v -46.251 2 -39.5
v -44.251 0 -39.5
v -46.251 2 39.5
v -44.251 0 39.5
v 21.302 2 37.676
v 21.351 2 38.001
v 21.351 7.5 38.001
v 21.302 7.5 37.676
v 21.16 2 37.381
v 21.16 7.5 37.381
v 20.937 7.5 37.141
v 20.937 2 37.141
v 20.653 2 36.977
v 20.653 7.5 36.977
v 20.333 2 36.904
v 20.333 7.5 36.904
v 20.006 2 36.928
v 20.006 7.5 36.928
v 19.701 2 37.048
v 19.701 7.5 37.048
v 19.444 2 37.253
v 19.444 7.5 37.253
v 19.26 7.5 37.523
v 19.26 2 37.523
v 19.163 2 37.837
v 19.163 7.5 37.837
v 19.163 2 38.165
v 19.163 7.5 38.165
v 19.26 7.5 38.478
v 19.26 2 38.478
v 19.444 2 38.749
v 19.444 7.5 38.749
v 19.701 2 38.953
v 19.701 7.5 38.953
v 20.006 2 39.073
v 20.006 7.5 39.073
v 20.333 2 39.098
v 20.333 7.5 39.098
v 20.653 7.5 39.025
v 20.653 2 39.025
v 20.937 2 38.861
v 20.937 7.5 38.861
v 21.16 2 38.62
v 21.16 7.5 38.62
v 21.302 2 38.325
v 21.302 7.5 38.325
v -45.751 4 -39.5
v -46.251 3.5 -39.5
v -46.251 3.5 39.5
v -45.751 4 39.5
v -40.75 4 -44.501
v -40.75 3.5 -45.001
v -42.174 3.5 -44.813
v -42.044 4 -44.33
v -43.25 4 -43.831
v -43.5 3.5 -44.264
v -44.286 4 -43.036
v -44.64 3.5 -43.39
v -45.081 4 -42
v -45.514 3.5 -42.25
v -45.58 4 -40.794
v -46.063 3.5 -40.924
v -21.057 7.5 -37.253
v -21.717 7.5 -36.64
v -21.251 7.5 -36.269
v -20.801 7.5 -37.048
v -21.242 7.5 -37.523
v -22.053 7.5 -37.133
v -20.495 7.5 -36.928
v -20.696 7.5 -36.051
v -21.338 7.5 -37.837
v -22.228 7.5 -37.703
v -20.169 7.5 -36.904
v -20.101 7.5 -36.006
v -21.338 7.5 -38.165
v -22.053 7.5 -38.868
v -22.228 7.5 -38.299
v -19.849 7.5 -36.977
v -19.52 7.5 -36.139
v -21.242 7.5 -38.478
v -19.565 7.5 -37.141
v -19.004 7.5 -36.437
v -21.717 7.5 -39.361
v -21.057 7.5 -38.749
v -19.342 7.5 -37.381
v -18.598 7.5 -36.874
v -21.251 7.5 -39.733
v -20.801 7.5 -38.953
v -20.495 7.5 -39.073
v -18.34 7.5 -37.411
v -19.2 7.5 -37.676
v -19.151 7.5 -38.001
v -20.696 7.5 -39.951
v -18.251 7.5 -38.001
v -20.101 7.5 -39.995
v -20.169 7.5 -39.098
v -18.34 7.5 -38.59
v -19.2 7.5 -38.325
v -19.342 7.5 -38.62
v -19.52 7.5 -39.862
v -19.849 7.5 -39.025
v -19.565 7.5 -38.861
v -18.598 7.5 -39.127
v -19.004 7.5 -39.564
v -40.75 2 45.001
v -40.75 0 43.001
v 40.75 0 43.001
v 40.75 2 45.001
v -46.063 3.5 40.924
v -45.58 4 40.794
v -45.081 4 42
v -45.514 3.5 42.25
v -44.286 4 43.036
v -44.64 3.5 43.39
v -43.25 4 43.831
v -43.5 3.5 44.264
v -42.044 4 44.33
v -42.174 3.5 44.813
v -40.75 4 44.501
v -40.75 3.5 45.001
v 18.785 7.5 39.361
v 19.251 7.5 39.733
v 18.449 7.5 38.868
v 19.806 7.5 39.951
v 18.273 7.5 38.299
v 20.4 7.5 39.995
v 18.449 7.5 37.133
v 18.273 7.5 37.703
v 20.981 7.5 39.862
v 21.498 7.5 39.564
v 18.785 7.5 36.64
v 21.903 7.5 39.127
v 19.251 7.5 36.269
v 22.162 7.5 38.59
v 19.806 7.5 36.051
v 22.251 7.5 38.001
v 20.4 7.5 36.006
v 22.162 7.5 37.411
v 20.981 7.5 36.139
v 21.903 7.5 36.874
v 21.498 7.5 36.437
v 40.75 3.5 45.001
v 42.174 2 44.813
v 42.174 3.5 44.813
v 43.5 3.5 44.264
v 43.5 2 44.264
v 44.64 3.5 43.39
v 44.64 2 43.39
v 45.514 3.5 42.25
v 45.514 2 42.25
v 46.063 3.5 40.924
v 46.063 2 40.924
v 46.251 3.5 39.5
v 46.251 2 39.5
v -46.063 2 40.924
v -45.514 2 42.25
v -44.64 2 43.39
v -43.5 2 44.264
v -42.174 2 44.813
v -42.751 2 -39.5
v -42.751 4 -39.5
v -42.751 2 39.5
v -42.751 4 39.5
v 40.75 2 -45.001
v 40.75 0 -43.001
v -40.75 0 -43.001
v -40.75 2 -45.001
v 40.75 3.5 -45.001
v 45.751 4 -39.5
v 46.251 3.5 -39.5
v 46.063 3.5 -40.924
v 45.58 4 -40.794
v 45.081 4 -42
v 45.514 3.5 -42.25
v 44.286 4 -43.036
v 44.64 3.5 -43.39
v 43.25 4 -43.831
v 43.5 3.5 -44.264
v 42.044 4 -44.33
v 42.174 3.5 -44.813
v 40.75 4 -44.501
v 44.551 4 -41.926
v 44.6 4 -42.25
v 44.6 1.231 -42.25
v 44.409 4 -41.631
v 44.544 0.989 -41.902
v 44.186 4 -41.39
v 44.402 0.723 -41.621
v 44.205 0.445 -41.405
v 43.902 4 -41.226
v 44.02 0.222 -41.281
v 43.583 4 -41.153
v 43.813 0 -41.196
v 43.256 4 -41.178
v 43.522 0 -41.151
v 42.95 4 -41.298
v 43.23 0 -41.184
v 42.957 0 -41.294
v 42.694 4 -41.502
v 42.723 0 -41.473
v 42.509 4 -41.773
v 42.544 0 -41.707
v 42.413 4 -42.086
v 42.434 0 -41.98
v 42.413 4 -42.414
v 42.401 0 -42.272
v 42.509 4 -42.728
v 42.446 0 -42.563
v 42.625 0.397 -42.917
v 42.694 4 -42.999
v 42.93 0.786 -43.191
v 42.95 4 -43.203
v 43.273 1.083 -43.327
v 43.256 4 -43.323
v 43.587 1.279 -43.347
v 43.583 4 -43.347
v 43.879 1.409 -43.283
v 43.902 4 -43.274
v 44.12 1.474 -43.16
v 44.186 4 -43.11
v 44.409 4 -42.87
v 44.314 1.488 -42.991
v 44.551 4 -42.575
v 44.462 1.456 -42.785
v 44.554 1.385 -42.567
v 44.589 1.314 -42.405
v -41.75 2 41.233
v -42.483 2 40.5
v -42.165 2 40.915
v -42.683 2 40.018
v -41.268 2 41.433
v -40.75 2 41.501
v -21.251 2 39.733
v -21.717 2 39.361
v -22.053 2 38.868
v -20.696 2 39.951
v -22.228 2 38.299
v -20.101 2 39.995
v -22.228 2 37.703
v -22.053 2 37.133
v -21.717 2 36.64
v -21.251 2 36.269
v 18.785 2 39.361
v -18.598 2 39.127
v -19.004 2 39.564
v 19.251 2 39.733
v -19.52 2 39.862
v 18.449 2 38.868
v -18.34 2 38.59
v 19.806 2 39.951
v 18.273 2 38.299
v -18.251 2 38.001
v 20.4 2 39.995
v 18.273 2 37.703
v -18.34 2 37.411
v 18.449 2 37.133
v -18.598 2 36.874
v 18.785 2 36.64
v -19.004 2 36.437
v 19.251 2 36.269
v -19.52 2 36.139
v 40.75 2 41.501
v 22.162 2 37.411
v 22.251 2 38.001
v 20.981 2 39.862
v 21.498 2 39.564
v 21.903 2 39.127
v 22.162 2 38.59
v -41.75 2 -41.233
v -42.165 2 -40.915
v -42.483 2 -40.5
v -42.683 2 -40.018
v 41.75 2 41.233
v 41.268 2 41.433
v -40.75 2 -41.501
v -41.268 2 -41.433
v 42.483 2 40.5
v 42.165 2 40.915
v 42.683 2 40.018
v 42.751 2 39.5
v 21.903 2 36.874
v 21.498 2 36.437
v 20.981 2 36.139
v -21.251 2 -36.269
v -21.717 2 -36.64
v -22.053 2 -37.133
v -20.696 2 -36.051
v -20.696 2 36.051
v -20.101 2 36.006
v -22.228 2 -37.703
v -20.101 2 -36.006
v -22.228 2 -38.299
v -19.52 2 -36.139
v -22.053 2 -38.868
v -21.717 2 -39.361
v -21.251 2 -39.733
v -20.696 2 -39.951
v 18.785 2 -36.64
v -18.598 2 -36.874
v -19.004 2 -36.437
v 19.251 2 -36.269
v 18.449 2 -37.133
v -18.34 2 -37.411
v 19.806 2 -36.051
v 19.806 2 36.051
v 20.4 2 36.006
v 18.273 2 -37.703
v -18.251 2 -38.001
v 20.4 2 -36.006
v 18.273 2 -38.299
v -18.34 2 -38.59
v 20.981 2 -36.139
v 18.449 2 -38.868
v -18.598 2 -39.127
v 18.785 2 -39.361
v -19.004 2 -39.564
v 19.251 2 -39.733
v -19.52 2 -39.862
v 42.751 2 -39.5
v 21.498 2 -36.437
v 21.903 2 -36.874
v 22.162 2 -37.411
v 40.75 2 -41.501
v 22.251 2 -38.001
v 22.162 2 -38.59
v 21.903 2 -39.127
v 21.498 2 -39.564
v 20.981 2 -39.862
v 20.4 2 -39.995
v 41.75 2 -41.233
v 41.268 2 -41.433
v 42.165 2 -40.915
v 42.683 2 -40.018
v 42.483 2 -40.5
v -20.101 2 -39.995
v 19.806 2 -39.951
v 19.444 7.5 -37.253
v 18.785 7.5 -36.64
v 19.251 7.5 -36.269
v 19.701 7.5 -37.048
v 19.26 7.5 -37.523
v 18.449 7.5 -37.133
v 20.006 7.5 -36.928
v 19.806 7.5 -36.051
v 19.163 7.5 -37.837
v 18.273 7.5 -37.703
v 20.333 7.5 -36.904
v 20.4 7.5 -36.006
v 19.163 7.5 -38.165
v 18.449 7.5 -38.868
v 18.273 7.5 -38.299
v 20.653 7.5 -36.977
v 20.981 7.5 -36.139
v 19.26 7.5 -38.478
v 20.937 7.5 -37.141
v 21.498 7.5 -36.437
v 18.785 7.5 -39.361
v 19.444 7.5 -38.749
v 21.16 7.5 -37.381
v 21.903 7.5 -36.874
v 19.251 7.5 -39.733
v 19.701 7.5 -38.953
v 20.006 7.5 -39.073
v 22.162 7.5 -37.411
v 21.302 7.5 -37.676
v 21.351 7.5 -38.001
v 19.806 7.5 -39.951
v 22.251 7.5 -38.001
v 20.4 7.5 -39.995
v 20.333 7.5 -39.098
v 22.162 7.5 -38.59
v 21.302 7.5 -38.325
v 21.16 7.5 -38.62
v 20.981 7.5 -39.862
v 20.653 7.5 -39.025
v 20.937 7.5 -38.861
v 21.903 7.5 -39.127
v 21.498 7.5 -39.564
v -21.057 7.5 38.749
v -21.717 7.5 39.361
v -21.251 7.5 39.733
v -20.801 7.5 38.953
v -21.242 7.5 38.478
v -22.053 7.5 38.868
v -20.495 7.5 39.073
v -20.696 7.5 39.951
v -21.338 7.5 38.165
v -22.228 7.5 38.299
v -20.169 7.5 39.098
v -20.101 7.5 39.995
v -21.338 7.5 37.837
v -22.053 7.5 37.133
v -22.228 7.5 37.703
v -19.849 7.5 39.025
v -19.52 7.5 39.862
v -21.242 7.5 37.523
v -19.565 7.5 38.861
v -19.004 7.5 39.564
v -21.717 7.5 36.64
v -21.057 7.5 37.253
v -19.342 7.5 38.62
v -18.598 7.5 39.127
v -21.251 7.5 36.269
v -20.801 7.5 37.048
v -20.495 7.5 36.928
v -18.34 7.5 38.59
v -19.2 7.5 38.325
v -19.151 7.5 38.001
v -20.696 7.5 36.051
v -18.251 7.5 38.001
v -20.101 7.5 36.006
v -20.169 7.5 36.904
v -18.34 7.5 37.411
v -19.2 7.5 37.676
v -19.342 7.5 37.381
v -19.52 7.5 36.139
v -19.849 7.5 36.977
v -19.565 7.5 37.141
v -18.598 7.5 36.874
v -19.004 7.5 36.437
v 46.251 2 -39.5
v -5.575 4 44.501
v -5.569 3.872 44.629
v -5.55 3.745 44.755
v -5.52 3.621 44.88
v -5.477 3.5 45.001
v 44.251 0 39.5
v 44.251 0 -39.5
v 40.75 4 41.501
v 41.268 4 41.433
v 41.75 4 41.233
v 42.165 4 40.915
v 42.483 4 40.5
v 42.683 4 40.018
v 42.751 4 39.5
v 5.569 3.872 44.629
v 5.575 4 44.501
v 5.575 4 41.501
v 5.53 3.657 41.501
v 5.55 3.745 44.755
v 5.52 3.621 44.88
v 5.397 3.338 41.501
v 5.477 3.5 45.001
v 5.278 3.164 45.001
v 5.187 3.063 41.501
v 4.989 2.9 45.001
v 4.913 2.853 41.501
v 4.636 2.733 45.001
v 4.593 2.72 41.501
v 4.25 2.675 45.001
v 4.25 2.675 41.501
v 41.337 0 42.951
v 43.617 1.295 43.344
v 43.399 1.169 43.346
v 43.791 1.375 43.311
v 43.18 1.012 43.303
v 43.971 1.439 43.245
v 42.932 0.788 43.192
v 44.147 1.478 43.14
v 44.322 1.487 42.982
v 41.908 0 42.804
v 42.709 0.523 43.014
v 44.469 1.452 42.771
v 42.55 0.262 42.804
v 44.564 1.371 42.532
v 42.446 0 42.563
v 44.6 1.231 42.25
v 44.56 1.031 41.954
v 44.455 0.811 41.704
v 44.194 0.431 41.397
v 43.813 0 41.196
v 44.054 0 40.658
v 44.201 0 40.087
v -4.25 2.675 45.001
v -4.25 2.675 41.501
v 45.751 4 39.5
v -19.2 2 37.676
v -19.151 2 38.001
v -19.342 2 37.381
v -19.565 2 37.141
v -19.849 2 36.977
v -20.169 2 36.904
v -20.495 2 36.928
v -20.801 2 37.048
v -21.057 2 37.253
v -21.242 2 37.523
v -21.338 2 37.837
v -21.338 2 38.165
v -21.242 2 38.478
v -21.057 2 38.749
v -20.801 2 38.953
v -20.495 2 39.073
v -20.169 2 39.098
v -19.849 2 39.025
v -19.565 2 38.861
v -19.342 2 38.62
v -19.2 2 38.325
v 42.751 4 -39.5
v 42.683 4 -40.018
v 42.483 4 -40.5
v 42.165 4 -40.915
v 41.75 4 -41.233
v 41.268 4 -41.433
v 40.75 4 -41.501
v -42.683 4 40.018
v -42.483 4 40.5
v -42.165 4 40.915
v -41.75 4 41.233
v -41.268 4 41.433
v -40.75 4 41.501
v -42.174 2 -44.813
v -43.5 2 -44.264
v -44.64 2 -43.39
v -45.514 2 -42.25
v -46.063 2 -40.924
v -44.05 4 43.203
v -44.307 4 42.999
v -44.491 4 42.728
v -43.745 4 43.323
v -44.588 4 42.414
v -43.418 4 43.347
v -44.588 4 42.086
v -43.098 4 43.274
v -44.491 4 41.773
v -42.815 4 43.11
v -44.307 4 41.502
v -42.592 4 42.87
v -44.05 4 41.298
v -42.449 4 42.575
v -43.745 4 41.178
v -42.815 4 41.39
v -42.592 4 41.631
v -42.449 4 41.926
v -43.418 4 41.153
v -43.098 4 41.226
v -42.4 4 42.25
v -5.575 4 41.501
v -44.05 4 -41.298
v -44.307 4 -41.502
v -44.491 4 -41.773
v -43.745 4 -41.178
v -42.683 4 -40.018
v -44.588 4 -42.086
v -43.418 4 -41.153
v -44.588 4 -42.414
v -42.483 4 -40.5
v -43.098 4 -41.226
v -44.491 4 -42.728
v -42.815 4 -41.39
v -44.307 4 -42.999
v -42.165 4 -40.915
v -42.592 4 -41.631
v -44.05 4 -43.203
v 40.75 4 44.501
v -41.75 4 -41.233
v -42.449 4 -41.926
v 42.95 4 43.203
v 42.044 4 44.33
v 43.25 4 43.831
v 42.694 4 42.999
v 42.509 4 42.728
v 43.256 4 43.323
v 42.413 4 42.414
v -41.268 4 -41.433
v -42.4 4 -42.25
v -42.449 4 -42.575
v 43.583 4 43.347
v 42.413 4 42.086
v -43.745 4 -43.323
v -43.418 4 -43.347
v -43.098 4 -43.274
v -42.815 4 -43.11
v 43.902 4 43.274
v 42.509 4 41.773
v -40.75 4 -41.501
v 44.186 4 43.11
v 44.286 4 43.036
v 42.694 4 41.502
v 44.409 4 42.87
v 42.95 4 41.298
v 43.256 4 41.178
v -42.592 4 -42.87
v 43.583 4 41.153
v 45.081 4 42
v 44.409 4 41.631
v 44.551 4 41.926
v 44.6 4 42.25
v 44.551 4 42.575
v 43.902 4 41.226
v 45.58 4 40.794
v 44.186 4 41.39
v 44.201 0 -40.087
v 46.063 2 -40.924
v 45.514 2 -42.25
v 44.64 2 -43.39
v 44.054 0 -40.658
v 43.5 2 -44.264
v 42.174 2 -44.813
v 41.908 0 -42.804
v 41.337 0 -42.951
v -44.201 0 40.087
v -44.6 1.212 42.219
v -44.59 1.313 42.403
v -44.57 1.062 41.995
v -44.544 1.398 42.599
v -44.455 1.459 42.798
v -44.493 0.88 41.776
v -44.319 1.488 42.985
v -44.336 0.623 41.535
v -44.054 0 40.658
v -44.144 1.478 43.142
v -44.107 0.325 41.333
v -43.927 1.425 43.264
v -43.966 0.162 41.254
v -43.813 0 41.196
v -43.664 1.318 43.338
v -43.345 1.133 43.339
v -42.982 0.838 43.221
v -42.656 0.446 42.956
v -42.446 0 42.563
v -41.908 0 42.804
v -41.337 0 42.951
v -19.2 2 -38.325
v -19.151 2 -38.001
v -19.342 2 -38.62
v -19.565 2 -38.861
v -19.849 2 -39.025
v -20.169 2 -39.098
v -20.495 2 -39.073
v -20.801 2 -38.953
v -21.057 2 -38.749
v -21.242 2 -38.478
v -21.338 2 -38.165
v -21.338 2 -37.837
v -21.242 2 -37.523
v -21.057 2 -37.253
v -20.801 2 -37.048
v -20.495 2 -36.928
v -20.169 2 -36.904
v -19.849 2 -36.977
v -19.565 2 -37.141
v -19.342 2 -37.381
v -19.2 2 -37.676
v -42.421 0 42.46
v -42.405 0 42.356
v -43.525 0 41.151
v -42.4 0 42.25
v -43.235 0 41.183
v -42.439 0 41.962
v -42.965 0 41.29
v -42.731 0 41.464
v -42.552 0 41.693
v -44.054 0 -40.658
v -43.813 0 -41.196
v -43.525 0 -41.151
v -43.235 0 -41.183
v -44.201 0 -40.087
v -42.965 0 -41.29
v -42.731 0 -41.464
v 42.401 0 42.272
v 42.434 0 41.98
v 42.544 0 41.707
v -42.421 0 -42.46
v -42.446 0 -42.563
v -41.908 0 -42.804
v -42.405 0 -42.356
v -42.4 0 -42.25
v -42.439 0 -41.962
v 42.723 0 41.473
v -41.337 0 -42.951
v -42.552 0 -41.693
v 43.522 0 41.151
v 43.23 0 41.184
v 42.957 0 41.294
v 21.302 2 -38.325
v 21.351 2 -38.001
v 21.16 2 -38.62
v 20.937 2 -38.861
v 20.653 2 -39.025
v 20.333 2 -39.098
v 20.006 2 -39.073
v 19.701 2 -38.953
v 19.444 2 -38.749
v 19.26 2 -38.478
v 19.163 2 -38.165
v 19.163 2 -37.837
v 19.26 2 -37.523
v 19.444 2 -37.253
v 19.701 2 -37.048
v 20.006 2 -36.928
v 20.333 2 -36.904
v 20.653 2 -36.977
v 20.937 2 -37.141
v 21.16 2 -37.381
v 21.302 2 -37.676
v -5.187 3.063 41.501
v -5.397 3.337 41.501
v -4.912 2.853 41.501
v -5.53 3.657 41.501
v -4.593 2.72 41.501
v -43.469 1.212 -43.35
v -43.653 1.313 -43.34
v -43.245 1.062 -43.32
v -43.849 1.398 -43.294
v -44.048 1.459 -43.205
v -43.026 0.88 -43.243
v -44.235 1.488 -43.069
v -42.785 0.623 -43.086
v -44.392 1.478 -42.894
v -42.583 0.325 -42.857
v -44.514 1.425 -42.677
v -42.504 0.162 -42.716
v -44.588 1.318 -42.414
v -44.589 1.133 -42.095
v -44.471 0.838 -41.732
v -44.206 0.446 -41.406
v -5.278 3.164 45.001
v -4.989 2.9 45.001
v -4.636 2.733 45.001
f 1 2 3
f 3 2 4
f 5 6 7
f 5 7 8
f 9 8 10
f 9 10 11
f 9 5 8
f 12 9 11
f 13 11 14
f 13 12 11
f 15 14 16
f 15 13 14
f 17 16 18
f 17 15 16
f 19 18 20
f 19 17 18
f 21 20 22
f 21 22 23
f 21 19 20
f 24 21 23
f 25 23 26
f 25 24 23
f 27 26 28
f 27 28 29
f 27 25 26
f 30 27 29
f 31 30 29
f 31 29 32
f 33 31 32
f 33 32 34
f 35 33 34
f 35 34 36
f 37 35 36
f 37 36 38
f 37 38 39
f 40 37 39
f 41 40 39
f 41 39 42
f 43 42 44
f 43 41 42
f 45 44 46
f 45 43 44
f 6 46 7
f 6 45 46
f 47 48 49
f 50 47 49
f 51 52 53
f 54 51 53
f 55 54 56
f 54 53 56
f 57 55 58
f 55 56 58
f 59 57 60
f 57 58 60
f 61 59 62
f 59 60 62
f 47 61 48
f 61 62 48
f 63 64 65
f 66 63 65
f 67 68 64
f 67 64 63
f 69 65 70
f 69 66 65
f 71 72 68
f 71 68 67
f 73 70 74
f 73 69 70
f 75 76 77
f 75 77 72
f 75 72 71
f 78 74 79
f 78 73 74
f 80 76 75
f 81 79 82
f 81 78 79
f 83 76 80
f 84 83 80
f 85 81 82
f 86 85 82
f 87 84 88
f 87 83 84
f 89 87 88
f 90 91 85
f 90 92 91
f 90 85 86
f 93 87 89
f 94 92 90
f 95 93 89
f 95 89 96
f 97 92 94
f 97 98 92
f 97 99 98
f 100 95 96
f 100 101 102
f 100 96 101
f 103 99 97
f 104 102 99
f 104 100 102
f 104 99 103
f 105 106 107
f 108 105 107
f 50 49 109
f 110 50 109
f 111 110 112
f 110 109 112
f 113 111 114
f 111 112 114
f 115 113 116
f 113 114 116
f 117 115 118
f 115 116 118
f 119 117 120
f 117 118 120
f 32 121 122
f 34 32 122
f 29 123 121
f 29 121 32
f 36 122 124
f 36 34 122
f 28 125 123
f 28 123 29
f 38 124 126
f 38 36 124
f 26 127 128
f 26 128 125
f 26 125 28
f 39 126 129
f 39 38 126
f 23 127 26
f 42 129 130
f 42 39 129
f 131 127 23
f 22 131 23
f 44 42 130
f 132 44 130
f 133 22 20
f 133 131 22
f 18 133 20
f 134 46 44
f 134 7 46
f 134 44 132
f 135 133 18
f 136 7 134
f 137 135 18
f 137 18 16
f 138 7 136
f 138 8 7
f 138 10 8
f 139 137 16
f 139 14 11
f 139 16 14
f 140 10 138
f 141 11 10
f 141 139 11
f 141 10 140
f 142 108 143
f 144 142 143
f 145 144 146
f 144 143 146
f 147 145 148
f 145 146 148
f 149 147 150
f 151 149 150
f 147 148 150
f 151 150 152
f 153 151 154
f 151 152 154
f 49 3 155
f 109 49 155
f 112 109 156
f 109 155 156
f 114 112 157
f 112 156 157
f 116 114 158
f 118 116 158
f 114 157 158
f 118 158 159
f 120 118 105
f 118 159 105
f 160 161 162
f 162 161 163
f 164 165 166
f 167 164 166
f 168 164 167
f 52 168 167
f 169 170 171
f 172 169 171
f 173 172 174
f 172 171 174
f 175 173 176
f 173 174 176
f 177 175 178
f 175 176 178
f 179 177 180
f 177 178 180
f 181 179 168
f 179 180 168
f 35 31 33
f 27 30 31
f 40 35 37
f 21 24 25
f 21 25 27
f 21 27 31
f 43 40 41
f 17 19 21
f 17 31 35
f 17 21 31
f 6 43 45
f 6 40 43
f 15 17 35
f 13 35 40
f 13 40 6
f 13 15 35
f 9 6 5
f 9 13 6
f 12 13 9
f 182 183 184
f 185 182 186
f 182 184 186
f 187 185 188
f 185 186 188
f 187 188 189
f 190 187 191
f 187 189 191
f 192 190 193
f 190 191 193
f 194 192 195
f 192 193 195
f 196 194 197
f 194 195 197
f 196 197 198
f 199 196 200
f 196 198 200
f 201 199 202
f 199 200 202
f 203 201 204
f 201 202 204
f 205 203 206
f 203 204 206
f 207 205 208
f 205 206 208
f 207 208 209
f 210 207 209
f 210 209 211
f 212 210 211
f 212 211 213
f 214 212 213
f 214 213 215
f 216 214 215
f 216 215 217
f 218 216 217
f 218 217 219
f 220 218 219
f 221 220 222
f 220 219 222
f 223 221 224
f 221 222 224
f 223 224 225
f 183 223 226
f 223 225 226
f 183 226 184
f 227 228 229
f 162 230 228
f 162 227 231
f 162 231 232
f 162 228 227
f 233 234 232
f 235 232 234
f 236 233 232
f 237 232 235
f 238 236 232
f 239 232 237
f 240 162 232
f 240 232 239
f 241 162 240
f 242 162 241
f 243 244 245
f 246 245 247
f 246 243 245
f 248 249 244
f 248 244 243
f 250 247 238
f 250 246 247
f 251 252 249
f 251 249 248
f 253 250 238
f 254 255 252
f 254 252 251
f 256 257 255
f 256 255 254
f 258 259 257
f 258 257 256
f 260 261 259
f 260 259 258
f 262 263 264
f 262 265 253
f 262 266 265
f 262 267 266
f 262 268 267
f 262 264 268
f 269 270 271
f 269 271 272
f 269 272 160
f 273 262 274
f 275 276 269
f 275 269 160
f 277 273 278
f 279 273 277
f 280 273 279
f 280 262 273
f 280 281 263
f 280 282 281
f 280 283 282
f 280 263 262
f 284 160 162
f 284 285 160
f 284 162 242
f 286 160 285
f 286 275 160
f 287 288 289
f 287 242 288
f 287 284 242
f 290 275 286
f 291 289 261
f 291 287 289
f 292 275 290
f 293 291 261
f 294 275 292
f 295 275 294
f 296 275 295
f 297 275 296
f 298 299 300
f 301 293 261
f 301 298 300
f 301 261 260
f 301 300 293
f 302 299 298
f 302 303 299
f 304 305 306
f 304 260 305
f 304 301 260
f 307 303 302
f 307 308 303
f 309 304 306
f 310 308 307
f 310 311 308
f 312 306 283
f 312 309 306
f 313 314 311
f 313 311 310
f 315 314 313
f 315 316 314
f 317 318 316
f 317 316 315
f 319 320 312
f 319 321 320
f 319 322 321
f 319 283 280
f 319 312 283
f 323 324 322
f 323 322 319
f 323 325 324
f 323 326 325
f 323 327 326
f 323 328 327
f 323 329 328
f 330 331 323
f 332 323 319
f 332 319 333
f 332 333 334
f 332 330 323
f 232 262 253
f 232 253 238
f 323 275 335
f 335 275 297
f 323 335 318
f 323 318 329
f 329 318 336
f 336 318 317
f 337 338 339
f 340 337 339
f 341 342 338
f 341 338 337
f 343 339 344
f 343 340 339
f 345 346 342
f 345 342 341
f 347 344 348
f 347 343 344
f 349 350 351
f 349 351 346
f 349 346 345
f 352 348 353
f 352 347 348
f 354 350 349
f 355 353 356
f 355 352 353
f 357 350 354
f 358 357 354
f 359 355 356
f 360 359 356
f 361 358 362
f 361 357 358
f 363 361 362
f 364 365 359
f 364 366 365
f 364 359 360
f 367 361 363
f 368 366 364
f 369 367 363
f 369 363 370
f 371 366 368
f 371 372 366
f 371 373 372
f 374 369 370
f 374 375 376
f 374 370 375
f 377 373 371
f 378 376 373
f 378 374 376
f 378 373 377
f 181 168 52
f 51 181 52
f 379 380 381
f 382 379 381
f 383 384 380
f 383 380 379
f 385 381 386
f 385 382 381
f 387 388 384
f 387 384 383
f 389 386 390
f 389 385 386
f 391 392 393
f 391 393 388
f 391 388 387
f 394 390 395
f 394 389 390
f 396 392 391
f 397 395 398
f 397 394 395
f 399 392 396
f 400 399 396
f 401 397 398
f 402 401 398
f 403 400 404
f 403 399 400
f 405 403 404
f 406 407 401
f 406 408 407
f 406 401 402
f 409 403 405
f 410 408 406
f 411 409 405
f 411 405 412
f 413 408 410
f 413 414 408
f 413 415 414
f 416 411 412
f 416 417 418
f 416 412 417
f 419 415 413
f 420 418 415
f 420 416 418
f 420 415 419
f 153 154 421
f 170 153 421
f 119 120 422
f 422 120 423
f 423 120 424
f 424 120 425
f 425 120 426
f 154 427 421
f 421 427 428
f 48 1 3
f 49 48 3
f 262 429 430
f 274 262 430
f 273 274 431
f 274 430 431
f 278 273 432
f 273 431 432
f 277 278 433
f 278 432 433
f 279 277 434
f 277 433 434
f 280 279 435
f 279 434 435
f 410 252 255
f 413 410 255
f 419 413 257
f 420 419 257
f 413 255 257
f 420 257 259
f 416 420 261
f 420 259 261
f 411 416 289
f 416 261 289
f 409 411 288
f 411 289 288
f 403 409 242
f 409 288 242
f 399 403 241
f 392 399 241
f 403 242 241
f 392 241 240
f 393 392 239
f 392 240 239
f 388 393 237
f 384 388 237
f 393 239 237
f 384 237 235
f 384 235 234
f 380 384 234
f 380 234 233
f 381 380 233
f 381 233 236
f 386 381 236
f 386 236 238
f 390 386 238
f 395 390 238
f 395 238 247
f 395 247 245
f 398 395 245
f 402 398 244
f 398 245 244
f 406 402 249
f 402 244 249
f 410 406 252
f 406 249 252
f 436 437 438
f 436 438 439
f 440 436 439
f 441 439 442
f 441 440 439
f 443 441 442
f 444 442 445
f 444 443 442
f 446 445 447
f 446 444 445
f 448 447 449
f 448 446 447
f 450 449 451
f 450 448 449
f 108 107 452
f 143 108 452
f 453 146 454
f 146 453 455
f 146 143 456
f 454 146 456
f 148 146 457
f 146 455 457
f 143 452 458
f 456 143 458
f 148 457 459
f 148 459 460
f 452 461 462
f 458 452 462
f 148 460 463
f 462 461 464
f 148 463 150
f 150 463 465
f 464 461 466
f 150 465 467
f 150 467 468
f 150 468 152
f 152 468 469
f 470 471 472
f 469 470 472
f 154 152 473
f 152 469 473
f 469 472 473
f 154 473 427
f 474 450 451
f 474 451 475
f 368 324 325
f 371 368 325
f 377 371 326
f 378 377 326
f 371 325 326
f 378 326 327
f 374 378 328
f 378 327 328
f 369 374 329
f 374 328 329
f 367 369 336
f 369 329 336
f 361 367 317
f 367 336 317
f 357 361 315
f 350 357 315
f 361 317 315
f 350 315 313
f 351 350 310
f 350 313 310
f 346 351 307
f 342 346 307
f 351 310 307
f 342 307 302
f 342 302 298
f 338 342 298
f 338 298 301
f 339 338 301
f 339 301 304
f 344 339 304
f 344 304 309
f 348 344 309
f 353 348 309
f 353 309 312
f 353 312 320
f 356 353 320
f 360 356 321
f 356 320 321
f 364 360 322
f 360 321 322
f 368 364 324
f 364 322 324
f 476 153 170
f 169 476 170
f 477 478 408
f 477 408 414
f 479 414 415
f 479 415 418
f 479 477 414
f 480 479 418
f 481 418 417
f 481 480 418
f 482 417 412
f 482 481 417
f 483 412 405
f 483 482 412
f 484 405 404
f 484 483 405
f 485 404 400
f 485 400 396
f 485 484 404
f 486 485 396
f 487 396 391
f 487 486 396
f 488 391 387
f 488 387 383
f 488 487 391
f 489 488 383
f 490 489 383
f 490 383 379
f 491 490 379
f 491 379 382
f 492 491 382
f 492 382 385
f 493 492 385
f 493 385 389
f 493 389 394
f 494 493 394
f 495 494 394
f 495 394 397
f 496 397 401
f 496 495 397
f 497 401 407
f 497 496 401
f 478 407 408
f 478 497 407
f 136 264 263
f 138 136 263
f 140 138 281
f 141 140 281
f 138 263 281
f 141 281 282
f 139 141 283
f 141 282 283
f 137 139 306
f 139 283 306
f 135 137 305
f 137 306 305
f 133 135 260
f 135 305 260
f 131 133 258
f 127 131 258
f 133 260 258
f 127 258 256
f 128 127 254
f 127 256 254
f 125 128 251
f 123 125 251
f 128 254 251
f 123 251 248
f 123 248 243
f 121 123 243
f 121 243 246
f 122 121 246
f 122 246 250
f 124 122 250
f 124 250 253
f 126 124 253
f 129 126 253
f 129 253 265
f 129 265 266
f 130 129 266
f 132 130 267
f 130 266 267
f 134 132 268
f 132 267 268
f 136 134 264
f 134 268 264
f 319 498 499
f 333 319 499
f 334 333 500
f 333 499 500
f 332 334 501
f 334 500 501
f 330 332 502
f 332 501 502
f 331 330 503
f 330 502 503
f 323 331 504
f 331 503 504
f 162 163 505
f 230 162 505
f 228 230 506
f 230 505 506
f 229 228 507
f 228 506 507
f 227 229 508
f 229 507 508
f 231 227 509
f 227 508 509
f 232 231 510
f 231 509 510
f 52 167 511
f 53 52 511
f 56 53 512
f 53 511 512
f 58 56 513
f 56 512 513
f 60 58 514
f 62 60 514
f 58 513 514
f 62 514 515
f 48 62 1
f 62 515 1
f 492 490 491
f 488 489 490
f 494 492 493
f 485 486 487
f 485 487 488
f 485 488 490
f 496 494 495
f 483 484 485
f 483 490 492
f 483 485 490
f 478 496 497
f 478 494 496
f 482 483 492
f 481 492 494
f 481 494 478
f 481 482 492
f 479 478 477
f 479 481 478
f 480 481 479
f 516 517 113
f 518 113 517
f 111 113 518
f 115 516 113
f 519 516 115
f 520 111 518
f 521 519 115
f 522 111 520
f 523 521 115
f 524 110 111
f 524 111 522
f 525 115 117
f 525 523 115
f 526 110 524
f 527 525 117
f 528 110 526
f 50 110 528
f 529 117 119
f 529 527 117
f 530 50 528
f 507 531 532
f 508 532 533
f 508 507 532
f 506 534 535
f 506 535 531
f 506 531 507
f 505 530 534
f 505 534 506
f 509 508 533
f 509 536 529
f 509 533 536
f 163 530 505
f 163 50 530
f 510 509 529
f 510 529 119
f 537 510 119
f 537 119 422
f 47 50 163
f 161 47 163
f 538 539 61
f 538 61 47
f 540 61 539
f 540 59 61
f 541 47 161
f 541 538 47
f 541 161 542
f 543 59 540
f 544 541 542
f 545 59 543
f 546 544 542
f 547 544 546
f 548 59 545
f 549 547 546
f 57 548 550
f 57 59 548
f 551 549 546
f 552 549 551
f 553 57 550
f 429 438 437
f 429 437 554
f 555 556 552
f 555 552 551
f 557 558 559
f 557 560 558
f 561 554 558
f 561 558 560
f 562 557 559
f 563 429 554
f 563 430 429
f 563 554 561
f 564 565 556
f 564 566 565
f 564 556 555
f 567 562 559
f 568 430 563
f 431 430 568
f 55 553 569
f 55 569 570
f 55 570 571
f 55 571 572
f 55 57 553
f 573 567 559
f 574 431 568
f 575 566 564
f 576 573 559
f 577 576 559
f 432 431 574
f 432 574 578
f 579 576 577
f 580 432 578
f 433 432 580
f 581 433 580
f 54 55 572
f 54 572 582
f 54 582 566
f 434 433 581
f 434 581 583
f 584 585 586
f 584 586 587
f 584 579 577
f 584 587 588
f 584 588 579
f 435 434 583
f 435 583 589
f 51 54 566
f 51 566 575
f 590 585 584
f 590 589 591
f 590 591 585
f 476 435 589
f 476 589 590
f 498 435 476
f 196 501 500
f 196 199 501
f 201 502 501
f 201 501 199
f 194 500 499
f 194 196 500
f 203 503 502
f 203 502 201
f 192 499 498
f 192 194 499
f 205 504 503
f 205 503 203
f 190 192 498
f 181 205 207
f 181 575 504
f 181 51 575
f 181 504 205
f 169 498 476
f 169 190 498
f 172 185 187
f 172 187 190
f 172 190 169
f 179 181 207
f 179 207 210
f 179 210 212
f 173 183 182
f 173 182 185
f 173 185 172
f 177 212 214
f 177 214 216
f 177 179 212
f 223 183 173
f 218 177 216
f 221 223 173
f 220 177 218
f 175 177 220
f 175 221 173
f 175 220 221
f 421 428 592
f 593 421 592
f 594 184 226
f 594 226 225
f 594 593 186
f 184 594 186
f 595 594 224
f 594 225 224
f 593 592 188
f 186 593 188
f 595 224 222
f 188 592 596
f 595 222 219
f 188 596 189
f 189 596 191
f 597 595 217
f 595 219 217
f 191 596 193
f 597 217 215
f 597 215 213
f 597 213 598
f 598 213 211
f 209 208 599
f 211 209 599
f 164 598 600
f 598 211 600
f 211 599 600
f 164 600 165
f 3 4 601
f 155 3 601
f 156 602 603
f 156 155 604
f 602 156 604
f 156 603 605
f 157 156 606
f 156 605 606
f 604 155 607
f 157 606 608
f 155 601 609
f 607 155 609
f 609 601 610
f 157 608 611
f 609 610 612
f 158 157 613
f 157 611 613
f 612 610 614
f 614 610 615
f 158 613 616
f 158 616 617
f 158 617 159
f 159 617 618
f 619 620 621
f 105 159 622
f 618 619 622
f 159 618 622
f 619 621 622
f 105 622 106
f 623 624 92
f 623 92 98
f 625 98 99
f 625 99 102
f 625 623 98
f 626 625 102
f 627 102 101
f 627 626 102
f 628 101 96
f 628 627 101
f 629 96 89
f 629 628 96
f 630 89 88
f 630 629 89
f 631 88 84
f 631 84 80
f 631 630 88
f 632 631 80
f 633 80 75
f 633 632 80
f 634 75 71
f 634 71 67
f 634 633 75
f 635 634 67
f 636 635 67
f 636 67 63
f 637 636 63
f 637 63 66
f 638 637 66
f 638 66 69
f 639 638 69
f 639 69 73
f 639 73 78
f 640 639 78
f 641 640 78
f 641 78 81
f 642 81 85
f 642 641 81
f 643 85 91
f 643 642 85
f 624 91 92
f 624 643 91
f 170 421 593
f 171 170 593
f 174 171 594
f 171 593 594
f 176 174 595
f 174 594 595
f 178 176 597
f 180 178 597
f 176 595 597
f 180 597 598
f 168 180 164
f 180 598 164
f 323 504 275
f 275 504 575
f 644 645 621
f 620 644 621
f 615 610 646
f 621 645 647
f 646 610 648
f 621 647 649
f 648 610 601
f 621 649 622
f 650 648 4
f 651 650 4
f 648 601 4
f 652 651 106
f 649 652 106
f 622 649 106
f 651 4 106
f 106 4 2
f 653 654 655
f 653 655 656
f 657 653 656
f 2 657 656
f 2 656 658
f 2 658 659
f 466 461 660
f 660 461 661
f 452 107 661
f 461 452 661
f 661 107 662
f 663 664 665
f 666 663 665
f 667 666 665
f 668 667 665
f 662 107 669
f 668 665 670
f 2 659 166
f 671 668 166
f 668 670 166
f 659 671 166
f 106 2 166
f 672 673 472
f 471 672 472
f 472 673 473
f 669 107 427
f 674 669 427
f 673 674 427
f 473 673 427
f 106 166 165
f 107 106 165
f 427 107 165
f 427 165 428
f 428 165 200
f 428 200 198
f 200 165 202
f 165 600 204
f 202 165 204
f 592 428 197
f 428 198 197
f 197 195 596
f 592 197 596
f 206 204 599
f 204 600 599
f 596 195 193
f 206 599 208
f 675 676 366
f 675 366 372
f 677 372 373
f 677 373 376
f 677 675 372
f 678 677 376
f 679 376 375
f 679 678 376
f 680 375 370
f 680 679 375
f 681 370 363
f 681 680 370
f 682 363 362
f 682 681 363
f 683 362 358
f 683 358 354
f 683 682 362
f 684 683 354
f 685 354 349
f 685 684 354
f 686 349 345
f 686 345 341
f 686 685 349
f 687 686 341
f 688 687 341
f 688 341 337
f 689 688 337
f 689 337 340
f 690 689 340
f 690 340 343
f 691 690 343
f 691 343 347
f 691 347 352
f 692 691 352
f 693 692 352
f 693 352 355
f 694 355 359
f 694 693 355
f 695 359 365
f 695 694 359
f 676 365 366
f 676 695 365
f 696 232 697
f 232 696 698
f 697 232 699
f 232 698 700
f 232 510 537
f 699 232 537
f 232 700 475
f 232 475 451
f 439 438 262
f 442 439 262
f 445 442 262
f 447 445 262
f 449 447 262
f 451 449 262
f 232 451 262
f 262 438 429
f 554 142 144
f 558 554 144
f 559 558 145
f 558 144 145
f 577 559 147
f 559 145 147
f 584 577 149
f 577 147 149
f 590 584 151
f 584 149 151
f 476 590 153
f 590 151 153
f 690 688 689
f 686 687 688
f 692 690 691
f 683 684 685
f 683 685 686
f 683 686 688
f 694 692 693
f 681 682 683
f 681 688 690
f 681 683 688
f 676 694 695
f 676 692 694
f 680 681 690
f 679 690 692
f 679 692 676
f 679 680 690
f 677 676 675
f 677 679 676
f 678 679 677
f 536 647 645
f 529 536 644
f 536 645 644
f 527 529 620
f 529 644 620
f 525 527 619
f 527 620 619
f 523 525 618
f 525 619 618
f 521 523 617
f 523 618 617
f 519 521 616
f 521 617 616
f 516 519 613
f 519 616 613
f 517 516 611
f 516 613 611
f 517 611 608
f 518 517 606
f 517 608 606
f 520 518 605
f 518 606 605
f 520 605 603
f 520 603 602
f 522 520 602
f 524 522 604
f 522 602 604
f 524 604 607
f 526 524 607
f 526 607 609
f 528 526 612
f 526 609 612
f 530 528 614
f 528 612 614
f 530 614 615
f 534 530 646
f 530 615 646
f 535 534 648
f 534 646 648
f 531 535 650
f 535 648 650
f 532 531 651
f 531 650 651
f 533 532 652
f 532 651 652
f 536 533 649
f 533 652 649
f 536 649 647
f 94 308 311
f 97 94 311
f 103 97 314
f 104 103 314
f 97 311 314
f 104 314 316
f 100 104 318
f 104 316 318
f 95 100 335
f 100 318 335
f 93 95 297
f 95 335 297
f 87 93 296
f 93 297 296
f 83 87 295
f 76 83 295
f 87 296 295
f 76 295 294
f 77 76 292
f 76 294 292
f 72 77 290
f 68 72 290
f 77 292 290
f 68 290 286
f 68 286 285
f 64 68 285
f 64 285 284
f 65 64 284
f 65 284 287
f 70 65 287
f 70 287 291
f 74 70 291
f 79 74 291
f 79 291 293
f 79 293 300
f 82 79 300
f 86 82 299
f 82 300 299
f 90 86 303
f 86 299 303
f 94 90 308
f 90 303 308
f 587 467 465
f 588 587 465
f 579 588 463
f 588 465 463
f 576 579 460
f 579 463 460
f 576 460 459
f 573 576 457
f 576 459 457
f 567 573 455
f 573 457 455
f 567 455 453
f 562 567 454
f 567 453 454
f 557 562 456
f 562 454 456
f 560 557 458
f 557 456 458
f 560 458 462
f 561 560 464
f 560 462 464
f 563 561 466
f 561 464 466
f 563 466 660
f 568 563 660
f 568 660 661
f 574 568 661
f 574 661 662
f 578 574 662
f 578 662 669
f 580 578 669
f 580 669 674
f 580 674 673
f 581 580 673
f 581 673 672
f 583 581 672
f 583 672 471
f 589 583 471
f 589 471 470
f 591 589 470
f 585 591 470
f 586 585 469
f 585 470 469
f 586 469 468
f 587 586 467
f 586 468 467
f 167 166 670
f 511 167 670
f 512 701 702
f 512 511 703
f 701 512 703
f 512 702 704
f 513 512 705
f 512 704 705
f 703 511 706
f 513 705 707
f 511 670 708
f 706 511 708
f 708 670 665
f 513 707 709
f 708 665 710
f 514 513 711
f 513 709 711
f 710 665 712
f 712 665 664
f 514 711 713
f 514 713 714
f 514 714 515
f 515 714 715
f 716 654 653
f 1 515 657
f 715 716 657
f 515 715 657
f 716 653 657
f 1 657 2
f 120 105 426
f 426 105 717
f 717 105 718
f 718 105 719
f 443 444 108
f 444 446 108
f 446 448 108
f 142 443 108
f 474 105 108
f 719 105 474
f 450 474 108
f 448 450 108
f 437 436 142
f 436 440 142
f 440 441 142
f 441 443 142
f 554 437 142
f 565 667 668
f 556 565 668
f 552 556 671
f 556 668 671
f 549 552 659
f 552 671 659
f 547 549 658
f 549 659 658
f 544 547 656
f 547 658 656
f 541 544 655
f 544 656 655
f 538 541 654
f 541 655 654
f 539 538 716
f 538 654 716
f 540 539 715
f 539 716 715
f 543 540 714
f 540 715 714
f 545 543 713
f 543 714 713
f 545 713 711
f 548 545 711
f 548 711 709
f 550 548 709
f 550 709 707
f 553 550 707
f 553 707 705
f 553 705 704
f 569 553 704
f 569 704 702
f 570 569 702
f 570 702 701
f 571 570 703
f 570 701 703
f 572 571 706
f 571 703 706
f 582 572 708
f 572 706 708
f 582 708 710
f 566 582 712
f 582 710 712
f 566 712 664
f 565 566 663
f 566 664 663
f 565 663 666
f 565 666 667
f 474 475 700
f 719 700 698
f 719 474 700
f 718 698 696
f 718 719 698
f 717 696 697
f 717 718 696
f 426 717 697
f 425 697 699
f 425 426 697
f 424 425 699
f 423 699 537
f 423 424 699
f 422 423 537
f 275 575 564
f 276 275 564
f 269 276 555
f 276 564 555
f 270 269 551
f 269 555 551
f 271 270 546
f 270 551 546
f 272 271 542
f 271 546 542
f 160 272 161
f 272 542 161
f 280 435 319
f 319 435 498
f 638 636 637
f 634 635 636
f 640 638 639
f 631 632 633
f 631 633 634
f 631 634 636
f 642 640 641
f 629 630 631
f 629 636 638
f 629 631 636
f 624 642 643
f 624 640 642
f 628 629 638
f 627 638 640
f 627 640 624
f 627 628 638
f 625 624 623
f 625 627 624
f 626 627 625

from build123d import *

# Parameters (mm, degrees)
BOSS_EXTRUDE1_DEPTH = 4
CUT_EXTRUDE1_DEPTH  = 2
CUT_EXTRUDE2_DEPTH  = 3.5
CHAMFER2_SIZE       = 2
CHAMFER3_SIZE       = 0.5
SKETCH4_R           = 2
SKETCH4_R_2         = 1.1
BOSS_EXTRUDE2_DEPTH = 5.5
SKETCH5_R           = 1.1
CUT_EXTRUDE3_DEPTH  = 4


with BuildPart() as part:
    # Sketch1 → Boss-Extrude1 (new body)
    with BuildSketch(Plane(origin=(0, 0, 0), x_dir=(1, 0, 0), z_dir=(0, 1, 0))):
        with BuildLine():
            Line((40.75, 45.000726786), (-40.75, 45.000726786))
            ThreePointArc((-40.75, 45.000726786), (-44.639601212, 43.389601212), (-46.250726786, 39.5))
            Line((-46.250726786, 39.5), (-46.250726786, -39.5))
            ThreePointArc((-46.250726786, -39.5), (-44.639601212, -43.389601212), (-40.75, -45.000726786))
            Line((-40.75, -45.000726786), (40.75, -45.000726786))
            ThreePointArc((40.75, -45.000726786), (44.639601212, -43.389601212), (46.250726786, -39.5))
            Line((46.250726786, -39.5), (46.250726786, 39.5))
            ThreePointArc((46.250726786, 39.5), (44.639601212, 43.389601212), (40.75, 45.000726786))
        make_face()
    extrude(amount=BOSS_EXTRUDE1_DEPTH)

    # Sketch2 → Cut-Extrude1 (cut)
    with BuildSketch(Plane(origin=(0, 4, 0), x_dir=(1, 0, 0), z_dir=(0, 1, 0))):
        with BuildLine():
            Line((-42.750726786, 39.5), (-42.750726786, -39.5))
            ThreePointArc((-42.750726786, -39.5), (-42.164727477, -40.914727477), (-40.75, -41.500726786))
            Line((-40.75, -41.500726786), (40.75, -41.500726786))
            ThreePointArc((40.75, -41.500726786), (42.164727477, -40.914727477), (42.750726786, -39.5))
            Line((42.750726786, -39.5), (42.750726786, 39.5))
            ThreePointArc((42.750726786, 39.5), (42.164727477, 40.914727477), (40.75, 41.500726786))
            Line((40.75, 41.500726786), (-40.75, 41.500726786))
            ThreePointArc((-40.75, 41.500726786), (-42.164727477, 40.914727477), (-42.750726786, 39.5))
        make_face()
    extrude(amount=-CUT_EXTRUDE1_DEPTH, mode=Mode.SUBTRACT)

    # Sketch3 → Cut-Extrude2 (cut)
    with BuildSketch(Plane.XY.offset(45.000726786)):
        with BuildLine():
            Line((-4.25, 5.325), (4.25, 5.325))
            ThreePointArc((4.25, 5.325), (5.575, 4), (4.25, 2.675))
            Line((4.25, 2.675), (-4.25, 2.675))
            ThreePointArc((-4.25, 2.675), (-5.575, 4), (-4.25, 5.325))
        make_face()
    extrude(amount=-CUT_EXTRUDE2_DEPTH, mode=Mode.SUBTRACT)

    # Chamfer2
    chamfer2_edges = [part.edges().sort_by_distance(p)[0] for p in [
        (44.639601212, 0, -43.389601212),
        (46.250726786, 0, 0),
        (44.639601212, 0, 43.389601212),
        (0, 0, 45.000726786),
        (-44.639601212, 0, 43.389601212),
        (-46.250726786, 0, 0),
        (-44.639601212, 0, -43.389601212),
        (0, 0, -45.000726786),
    ]]
    chamfer(chamfer2_edges, length=CHAMFER2_SIZE)

    # Chamfer3
    chamfer3_edges = [part.edges().sort_by_distance(p)[0] for p in [
        (46.250726786, 4, 0),
        (44.639601212, 4, -43.389601212),
        (0, 4, -45.000726786),
        (-44.639601212, 4, -43.389601212),
        (-46.250726786, 4, 0),
        (-44.639601212, 4, 43.389601212),
        (-23.1625, 4, 45.000726786),
        (23.1625, 4, 45.000726786),
        (44.639601212, 4, 43.389601212),
    ]]
    chamfer(chamfer3_edges, length=CHAMFER3_SIZE)

    # Sketch4 → Boss-Extrude2 (add)
    with BuildSketch(Plane(origin=(0, 2, 0), x_dir=(1, 0, 0), z_dir=(0, 1, 0))):
        with Locations((-20.250726786, -38.000726786)):
            Circle(SKETCH4_R)
        with Locations((-20.250726786, -38.000726786)):
            Circle(SKETCH4_R_2, mode=Mode.SUBTRACT)
        with Locations((20.250726786, -38.000726786)):
            Circle(SKETCH4_R)
        with Locations((20.250726786, -38.000726786)):
            Circle(SKETCH4_R_2, mode=Mode.SUBTRACT)
        with Locations((20.250726786, 38.000726786)):
            Circle(SKETCH4_R)
        with Locations((20.250726786, 38.000726786)):
            Circle(SKETCH4_R_2, mode=Mode.SUBTRACT)
        with Locations((-20.250726786, 38.000726786)):
            Circle(SKETCH4_R)
        with Locations((-20.250726786, 38.000726786)):
            Circle(SKETCH4_R_2, mode=Mode.SUBTRACT)
    extrude(amount=BOSS_EXTRUDE2_DEPTH)

    # Sketch5 → Cut-Extrude3 (cut)
    with BuildSketch(Plane.XZ):
        with Locations((-43.500363393, 42.250363393)):
            Circle(SKETCH5_R)
        with Locations((43.500363393, 42.250363393)):
            Circle(SKETCH5_R)
        with Locations((43.500363393, -42.250363393)):
            Circle(SKETCH5_R)
        with Locations((-43.500363393, -42.250363393)):
            Circle(SKETCH5_R)
    extrude(amount=-CUT_EXTRUDE3_DEPTH, mode=Mode.SUBTRACT)


solid = part.part
